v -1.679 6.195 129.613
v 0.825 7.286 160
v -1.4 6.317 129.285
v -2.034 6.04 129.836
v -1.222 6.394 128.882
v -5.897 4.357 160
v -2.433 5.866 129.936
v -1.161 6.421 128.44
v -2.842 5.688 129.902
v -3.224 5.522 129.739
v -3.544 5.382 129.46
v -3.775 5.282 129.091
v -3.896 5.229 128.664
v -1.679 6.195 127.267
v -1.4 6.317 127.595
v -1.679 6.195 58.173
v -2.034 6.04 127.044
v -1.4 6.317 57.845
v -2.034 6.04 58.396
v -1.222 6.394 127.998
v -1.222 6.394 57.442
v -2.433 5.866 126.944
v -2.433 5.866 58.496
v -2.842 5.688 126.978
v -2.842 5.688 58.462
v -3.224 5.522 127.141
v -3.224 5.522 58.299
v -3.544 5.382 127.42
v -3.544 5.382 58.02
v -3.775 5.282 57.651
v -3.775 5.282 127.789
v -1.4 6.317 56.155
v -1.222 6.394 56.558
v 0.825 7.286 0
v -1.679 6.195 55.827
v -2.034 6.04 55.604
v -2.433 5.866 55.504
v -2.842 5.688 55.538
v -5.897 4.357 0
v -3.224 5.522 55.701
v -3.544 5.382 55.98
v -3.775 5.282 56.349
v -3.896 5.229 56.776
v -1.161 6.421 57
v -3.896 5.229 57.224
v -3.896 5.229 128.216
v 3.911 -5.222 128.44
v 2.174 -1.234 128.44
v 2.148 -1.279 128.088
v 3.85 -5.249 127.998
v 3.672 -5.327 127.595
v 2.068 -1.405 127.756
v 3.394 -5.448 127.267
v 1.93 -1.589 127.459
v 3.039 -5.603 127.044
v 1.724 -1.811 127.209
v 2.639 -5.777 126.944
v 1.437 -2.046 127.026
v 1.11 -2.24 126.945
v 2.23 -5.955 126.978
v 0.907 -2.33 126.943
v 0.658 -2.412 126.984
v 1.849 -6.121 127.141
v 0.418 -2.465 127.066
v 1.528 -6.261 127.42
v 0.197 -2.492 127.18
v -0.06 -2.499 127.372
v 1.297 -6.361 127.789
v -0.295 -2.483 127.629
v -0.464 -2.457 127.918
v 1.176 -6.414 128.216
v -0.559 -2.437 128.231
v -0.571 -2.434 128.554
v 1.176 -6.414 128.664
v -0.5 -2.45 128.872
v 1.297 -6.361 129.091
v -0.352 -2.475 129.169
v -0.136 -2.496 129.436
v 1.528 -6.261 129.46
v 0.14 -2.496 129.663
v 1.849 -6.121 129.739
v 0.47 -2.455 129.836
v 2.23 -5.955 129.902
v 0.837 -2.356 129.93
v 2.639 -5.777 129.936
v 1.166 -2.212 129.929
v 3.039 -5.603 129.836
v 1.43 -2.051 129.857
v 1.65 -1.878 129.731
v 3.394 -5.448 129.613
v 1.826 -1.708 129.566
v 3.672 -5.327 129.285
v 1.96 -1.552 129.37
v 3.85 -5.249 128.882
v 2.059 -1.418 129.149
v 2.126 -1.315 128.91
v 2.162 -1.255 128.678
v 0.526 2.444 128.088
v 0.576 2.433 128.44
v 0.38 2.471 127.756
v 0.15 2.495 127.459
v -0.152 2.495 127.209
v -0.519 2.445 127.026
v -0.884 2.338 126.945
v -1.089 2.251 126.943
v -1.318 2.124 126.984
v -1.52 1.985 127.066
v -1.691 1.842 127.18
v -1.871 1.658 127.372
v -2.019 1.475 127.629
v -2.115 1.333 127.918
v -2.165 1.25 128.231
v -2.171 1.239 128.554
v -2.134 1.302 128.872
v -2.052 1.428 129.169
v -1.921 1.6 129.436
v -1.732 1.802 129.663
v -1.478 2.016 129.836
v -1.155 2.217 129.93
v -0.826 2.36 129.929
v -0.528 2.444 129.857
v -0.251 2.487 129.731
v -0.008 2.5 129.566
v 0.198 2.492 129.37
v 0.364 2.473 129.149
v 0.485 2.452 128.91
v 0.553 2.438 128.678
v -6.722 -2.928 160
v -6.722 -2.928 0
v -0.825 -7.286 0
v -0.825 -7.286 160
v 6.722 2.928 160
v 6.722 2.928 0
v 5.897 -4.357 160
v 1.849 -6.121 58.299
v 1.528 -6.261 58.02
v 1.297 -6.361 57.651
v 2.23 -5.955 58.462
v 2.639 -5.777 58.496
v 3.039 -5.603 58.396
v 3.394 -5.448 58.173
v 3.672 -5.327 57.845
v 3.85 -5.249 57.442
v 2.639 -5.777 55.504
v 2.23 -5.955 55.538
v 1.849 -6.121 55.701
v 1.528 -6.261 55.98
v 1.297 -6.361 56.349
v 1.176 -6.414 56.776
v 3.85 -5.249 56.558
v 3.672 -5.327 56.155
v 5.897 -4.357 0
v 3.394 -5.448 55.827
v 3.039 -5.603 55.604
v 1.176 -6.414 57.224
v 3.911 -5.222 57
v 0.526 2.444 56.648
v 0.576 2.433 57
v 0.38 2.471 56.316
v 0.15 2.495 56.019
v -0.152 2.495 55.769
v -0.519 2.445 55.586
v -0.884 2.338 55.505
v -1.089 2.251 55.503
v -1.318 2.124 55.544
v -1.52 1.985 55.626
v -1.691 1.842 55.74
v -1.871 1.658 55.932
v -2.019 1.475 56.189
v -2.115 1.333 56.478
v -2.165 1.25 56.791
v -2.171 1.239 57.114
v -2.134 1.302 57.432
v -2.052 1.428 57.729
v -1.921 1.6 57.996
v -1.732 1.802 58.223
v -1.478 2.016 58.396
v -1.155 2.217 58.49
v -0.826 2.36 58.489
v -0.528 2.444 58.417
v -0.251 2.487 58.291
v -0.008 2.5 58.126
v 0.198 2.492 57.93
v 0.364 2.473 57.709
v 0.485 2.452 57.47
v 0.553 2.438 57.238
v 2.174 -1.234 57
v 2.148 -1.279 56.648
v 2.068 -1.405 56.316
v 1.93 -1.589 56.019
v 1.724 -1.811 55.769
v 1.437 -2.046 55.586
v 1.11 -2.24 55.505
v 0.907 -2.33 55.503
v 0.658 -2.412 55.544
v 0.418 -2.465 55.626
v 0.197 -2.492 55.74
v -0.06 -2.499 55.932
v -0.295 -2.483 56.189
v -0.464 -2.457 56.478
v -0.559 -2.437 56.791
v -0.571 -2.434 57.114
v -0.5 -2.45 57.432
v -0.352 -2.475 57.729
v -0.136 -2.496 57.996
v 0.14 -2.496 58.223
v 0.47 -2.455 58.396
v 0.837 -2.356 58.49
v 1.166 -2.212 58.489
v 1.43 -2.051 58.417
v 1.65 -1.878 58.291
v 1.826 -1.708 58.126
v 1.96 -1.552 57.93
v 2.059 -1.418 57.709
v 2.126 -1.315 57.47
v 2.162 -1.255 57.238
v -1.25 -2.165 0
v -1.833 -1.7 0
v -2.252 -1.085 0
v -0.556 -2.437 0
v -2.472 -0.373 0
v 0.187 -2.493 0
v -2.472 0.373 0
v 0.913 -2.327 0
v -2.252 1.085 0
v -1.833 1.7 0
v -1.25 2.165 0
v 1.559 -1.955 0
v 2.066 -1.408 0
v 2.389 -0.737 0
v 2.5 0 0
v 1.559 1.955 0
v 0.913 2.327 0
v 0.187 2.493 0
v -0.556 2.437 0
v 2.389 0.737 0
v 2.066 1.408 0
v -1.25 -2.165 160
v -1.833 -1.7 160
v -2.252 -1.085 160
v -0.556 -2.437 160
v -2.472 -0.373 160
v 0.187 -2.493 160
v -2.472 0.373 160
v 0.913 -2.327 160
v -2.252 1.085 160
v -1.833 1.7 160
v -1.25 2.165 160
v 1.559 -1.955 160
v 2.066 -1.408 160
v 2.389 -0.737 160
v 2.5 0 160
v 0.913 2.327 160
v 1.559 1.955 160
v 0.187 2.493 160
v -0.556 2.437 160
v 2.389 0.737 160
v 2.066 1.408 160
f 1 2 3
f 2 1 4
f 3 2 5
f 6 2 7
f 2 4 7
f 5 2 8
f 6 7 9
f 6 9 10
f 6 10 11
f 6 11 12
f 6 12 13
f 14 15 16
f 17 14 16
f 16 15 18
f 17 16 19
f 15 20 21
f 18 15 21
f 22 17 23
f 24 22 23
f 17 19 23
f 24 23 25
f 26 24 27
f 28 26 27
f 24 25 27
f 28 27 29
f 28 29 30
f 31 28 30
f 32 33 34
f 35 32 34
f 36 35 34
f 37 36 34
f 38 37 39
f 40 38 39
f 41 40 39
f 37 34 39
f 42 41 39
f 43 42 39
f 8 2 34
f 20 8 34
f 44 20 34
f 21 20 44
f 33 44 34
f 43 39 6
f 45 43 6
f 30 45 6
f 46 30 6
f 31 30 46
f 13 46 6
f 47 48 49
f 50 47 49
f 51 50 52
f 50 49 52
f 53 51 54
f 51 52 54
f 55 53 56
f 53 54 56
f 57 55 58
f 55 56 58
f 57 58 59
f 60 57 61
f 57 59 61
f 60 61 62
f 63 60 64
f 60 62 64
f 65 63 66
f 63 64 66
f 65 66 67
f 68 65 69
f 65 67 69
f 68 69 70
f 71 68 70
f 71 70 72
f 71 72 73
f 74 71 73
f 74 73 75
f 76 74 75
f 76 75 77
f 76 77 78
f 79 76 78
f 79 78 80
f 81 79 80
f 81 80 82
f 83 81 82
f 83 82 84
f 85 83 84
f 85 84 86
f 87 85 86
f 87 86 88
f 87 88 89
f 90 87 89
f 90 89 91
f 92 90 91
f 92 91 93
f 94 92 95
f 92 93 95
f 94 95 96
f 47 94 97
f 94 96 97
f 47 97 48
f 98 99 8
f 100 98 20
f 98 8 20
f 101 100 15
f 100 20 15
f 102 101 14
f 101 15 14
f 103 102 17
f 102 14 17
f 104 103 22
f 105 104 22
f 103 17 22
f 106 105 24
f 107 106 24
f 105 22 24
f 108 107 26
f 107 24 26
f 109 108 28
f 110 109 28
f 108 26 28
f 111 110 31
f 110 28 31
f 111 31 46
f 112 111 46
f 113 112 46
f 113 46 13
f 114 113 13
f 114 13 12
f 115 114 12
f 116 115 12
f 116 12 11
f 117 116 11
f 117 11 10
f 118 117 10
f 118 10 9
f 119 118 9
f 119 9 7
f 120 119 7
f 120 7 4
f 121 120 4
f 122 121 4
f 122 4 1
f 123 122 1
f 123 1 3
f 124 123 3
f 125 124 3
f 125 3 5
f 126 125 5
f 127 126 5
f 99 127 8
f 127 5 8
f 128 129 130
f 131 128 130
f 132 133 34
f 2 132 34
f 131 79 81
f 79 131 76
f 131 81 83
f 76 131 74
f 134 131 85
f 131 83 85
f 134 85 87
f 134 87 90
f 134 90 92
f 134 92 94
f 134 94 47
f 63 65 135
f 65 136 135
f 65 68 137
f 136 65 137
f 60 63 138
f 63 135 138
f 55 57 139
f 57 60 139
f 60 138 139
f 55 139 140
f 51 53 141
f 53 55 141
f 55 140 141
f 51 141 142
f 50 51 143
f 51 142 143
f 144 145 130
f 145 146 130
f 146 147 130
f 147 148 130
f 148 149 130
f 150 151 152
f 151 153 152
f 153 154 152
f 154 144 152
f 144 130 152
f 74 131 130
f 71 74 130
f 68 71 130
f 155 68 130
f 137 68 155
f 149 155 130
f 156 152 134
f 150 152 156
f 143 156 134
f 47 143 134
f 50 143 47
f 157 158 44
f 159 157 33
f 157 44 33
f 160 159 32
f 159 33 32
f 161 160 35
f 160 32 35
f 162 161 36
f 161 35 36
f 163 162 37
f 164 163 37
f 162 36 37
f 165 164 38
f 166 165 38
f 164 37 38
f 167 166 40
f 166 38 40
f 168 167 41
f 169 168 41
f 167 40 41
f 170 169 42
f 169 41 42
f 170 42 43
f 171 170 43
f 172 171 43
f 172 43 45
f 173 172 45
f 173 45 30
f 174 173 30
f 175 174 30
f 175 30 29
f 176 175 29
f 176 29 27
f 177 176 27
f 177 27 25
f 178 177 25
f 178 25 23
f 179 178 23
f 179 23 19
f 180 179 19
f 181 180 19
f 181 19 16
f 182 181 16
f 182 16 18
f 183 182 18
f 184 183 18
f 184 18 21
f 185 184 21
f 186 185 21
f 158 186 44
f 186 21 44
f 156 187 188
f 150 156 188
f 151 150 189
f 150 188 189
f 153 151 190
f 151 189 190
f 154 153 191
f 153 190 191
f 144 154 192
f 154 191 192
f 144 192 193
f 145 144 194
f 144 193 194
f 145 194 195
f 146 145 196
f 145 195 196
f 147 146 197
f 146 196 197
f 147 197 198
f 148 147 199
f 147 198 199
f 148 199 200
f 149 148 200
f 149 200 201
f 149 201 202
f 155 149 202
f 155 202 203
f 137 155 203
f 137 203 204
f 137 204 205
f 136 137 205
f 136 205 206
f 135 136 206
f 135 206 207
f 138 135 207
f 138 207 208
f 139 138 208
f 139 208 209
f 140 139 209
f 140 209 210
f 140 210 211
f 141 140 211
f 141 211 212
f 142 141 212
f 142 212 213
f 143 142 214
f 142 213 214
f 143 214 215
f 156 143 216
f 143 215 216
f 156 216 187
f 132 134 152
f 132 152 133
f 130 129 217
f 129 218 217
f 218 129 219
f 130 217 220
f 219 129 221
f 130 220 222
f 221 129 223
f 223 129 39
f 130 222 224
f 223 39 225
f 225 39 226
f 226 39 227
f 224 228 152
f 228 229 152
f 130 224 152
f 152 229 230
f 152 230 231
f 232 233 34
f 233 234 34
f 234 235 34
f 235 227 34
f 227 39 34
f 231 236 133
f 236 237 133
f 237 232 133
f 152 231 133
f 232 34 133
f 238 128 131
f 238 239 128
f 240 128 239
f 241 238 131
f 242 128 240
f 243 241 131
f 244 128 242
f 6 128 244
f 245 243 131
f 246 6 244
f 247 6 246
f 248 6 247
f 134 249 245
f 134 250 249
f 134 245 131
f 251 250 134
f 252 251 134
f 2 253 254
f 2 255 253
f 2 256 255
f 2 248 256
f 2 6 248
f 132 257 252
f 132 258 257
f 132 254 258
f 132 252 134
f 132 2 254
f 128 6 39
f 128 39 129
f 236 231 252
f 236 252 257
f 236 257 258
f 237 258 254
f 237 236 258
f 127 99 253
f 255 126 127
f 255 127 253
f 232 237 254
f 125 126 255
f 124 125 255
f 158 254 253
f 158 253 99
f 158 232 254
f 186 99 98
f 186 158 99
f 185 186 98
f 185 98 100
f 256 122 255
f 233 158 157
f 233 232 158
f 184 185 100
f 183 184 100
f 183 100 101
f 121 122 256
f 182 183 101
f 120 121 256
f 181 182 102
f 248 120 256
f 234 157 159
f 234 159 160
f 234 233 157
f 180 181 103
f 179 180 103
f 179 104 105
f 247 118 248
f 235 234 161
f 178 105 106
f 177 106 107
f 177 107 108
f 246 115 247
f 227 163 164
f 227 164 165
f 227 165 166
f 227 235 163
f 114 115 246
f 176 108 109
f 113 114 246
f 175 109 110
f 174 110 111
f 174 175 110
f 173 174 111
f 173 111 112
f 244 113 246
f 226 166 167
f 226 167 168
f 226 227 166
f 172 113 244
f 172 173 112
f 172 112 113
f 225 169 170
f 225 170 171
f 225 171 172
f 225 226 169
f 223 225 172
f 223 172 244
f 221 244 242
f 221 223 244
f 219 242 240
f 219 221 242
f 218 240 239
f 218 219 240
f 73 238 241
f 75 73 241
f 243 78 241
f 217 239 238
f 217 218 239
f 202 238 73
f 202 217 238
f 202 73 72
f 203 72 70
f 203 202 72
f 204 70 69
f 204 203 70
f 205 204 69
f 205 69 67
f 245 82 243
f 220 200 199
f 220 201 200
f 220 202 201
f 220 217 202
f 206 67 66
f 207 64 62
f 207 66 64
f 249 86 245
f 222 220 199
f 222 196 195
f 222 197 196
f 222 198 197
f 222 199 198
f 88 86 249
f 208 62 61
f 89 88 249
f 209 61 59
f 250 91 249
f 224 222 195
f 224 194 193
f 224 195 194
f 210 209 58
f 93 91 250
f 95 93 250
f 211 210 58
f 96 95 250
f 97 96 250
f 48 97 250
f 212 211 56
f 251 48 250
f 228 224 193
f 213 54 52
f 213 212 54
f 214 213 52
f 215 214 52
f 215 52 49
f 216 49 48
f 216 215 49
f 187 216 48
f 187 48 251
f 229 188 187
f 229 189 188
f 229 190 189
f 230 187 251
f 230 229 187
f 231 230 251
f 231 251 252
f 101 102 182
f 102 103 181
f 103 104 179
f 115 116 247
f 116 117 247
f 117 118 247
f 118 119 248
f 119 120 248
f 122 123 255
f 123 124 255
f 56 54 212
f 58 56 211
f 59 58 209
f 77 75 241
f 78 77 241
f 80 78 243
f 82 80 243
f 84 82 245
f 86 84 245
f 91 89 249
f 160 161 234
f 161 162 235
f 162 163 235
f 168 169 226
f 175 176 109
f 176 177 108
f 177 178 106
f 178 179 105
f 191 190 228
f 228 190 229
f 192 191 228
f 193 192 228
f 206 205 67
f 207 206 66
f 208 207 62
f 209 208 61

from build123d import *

# Parameters (mm, degrees)
ESBO_O1_R                = 2.5
RESSALTO_EXTRUS_O1_DEPTH = 160
ESBO_O2_R                = 1.5
CORTE_EXTRUS_O1_DEPTH    = 16.714243329
ESBO_O3_R                = 1.5
CORTE_EXTRUS_O2_DEPTH    = 16.714243329


with BuildPart() as part:
    # Esboço1 → Ressalto-extrusão1 (new body)
    with BuildSketch(Plane.XY):
        Polygon((5.897209639, -4.357321633), (6.722156046, 2.928472542), (0.824946407, 7.285794175), (-5.897209639, 4.357321633), (-6.722156046, -2.928472542), (-0.824946407, -7.285794175), align=None)
        Circle(ESBO_O1_R, mode=Mode.SUBTRACT)
    extrude(amount=RESSALTO_EXTRUS_O1_DEPTH)

    # Esboço2 → Corte-extrusão1 (cut, through all)
    with BuildSketch(Plane(origin=(-2.536131616, 5.821557904, 0), x_dir=(0.916780772, 0.399390806, 0), z_dir=(-0.399390806, 0.916780772, 0))):
        with Locations((0, -57)):
            Circle(ESBO_O2_R)
    extrude(amount=-CORTE_EXTRUS_O1_DEPTH, mode=Mode.SUBTRACT)

    # Esboço3 → Corte-extrusão2 (cut, through all)
    with BuildSketch(Plane(origin=(-2.536131616, 5.821557904, 0), x_dir=(0.916780772, 0.399390806, 0), z_dir=(-0.399390806, 0.916780772, 0))):
        with Locations((0, -128.44)):
            Circle(ESBO_O3_R)
    extrude(amount=-CORTE_EXTRUS_O2_DEPTH, mode=Mode.SUBTRACT)


solid = part.part
